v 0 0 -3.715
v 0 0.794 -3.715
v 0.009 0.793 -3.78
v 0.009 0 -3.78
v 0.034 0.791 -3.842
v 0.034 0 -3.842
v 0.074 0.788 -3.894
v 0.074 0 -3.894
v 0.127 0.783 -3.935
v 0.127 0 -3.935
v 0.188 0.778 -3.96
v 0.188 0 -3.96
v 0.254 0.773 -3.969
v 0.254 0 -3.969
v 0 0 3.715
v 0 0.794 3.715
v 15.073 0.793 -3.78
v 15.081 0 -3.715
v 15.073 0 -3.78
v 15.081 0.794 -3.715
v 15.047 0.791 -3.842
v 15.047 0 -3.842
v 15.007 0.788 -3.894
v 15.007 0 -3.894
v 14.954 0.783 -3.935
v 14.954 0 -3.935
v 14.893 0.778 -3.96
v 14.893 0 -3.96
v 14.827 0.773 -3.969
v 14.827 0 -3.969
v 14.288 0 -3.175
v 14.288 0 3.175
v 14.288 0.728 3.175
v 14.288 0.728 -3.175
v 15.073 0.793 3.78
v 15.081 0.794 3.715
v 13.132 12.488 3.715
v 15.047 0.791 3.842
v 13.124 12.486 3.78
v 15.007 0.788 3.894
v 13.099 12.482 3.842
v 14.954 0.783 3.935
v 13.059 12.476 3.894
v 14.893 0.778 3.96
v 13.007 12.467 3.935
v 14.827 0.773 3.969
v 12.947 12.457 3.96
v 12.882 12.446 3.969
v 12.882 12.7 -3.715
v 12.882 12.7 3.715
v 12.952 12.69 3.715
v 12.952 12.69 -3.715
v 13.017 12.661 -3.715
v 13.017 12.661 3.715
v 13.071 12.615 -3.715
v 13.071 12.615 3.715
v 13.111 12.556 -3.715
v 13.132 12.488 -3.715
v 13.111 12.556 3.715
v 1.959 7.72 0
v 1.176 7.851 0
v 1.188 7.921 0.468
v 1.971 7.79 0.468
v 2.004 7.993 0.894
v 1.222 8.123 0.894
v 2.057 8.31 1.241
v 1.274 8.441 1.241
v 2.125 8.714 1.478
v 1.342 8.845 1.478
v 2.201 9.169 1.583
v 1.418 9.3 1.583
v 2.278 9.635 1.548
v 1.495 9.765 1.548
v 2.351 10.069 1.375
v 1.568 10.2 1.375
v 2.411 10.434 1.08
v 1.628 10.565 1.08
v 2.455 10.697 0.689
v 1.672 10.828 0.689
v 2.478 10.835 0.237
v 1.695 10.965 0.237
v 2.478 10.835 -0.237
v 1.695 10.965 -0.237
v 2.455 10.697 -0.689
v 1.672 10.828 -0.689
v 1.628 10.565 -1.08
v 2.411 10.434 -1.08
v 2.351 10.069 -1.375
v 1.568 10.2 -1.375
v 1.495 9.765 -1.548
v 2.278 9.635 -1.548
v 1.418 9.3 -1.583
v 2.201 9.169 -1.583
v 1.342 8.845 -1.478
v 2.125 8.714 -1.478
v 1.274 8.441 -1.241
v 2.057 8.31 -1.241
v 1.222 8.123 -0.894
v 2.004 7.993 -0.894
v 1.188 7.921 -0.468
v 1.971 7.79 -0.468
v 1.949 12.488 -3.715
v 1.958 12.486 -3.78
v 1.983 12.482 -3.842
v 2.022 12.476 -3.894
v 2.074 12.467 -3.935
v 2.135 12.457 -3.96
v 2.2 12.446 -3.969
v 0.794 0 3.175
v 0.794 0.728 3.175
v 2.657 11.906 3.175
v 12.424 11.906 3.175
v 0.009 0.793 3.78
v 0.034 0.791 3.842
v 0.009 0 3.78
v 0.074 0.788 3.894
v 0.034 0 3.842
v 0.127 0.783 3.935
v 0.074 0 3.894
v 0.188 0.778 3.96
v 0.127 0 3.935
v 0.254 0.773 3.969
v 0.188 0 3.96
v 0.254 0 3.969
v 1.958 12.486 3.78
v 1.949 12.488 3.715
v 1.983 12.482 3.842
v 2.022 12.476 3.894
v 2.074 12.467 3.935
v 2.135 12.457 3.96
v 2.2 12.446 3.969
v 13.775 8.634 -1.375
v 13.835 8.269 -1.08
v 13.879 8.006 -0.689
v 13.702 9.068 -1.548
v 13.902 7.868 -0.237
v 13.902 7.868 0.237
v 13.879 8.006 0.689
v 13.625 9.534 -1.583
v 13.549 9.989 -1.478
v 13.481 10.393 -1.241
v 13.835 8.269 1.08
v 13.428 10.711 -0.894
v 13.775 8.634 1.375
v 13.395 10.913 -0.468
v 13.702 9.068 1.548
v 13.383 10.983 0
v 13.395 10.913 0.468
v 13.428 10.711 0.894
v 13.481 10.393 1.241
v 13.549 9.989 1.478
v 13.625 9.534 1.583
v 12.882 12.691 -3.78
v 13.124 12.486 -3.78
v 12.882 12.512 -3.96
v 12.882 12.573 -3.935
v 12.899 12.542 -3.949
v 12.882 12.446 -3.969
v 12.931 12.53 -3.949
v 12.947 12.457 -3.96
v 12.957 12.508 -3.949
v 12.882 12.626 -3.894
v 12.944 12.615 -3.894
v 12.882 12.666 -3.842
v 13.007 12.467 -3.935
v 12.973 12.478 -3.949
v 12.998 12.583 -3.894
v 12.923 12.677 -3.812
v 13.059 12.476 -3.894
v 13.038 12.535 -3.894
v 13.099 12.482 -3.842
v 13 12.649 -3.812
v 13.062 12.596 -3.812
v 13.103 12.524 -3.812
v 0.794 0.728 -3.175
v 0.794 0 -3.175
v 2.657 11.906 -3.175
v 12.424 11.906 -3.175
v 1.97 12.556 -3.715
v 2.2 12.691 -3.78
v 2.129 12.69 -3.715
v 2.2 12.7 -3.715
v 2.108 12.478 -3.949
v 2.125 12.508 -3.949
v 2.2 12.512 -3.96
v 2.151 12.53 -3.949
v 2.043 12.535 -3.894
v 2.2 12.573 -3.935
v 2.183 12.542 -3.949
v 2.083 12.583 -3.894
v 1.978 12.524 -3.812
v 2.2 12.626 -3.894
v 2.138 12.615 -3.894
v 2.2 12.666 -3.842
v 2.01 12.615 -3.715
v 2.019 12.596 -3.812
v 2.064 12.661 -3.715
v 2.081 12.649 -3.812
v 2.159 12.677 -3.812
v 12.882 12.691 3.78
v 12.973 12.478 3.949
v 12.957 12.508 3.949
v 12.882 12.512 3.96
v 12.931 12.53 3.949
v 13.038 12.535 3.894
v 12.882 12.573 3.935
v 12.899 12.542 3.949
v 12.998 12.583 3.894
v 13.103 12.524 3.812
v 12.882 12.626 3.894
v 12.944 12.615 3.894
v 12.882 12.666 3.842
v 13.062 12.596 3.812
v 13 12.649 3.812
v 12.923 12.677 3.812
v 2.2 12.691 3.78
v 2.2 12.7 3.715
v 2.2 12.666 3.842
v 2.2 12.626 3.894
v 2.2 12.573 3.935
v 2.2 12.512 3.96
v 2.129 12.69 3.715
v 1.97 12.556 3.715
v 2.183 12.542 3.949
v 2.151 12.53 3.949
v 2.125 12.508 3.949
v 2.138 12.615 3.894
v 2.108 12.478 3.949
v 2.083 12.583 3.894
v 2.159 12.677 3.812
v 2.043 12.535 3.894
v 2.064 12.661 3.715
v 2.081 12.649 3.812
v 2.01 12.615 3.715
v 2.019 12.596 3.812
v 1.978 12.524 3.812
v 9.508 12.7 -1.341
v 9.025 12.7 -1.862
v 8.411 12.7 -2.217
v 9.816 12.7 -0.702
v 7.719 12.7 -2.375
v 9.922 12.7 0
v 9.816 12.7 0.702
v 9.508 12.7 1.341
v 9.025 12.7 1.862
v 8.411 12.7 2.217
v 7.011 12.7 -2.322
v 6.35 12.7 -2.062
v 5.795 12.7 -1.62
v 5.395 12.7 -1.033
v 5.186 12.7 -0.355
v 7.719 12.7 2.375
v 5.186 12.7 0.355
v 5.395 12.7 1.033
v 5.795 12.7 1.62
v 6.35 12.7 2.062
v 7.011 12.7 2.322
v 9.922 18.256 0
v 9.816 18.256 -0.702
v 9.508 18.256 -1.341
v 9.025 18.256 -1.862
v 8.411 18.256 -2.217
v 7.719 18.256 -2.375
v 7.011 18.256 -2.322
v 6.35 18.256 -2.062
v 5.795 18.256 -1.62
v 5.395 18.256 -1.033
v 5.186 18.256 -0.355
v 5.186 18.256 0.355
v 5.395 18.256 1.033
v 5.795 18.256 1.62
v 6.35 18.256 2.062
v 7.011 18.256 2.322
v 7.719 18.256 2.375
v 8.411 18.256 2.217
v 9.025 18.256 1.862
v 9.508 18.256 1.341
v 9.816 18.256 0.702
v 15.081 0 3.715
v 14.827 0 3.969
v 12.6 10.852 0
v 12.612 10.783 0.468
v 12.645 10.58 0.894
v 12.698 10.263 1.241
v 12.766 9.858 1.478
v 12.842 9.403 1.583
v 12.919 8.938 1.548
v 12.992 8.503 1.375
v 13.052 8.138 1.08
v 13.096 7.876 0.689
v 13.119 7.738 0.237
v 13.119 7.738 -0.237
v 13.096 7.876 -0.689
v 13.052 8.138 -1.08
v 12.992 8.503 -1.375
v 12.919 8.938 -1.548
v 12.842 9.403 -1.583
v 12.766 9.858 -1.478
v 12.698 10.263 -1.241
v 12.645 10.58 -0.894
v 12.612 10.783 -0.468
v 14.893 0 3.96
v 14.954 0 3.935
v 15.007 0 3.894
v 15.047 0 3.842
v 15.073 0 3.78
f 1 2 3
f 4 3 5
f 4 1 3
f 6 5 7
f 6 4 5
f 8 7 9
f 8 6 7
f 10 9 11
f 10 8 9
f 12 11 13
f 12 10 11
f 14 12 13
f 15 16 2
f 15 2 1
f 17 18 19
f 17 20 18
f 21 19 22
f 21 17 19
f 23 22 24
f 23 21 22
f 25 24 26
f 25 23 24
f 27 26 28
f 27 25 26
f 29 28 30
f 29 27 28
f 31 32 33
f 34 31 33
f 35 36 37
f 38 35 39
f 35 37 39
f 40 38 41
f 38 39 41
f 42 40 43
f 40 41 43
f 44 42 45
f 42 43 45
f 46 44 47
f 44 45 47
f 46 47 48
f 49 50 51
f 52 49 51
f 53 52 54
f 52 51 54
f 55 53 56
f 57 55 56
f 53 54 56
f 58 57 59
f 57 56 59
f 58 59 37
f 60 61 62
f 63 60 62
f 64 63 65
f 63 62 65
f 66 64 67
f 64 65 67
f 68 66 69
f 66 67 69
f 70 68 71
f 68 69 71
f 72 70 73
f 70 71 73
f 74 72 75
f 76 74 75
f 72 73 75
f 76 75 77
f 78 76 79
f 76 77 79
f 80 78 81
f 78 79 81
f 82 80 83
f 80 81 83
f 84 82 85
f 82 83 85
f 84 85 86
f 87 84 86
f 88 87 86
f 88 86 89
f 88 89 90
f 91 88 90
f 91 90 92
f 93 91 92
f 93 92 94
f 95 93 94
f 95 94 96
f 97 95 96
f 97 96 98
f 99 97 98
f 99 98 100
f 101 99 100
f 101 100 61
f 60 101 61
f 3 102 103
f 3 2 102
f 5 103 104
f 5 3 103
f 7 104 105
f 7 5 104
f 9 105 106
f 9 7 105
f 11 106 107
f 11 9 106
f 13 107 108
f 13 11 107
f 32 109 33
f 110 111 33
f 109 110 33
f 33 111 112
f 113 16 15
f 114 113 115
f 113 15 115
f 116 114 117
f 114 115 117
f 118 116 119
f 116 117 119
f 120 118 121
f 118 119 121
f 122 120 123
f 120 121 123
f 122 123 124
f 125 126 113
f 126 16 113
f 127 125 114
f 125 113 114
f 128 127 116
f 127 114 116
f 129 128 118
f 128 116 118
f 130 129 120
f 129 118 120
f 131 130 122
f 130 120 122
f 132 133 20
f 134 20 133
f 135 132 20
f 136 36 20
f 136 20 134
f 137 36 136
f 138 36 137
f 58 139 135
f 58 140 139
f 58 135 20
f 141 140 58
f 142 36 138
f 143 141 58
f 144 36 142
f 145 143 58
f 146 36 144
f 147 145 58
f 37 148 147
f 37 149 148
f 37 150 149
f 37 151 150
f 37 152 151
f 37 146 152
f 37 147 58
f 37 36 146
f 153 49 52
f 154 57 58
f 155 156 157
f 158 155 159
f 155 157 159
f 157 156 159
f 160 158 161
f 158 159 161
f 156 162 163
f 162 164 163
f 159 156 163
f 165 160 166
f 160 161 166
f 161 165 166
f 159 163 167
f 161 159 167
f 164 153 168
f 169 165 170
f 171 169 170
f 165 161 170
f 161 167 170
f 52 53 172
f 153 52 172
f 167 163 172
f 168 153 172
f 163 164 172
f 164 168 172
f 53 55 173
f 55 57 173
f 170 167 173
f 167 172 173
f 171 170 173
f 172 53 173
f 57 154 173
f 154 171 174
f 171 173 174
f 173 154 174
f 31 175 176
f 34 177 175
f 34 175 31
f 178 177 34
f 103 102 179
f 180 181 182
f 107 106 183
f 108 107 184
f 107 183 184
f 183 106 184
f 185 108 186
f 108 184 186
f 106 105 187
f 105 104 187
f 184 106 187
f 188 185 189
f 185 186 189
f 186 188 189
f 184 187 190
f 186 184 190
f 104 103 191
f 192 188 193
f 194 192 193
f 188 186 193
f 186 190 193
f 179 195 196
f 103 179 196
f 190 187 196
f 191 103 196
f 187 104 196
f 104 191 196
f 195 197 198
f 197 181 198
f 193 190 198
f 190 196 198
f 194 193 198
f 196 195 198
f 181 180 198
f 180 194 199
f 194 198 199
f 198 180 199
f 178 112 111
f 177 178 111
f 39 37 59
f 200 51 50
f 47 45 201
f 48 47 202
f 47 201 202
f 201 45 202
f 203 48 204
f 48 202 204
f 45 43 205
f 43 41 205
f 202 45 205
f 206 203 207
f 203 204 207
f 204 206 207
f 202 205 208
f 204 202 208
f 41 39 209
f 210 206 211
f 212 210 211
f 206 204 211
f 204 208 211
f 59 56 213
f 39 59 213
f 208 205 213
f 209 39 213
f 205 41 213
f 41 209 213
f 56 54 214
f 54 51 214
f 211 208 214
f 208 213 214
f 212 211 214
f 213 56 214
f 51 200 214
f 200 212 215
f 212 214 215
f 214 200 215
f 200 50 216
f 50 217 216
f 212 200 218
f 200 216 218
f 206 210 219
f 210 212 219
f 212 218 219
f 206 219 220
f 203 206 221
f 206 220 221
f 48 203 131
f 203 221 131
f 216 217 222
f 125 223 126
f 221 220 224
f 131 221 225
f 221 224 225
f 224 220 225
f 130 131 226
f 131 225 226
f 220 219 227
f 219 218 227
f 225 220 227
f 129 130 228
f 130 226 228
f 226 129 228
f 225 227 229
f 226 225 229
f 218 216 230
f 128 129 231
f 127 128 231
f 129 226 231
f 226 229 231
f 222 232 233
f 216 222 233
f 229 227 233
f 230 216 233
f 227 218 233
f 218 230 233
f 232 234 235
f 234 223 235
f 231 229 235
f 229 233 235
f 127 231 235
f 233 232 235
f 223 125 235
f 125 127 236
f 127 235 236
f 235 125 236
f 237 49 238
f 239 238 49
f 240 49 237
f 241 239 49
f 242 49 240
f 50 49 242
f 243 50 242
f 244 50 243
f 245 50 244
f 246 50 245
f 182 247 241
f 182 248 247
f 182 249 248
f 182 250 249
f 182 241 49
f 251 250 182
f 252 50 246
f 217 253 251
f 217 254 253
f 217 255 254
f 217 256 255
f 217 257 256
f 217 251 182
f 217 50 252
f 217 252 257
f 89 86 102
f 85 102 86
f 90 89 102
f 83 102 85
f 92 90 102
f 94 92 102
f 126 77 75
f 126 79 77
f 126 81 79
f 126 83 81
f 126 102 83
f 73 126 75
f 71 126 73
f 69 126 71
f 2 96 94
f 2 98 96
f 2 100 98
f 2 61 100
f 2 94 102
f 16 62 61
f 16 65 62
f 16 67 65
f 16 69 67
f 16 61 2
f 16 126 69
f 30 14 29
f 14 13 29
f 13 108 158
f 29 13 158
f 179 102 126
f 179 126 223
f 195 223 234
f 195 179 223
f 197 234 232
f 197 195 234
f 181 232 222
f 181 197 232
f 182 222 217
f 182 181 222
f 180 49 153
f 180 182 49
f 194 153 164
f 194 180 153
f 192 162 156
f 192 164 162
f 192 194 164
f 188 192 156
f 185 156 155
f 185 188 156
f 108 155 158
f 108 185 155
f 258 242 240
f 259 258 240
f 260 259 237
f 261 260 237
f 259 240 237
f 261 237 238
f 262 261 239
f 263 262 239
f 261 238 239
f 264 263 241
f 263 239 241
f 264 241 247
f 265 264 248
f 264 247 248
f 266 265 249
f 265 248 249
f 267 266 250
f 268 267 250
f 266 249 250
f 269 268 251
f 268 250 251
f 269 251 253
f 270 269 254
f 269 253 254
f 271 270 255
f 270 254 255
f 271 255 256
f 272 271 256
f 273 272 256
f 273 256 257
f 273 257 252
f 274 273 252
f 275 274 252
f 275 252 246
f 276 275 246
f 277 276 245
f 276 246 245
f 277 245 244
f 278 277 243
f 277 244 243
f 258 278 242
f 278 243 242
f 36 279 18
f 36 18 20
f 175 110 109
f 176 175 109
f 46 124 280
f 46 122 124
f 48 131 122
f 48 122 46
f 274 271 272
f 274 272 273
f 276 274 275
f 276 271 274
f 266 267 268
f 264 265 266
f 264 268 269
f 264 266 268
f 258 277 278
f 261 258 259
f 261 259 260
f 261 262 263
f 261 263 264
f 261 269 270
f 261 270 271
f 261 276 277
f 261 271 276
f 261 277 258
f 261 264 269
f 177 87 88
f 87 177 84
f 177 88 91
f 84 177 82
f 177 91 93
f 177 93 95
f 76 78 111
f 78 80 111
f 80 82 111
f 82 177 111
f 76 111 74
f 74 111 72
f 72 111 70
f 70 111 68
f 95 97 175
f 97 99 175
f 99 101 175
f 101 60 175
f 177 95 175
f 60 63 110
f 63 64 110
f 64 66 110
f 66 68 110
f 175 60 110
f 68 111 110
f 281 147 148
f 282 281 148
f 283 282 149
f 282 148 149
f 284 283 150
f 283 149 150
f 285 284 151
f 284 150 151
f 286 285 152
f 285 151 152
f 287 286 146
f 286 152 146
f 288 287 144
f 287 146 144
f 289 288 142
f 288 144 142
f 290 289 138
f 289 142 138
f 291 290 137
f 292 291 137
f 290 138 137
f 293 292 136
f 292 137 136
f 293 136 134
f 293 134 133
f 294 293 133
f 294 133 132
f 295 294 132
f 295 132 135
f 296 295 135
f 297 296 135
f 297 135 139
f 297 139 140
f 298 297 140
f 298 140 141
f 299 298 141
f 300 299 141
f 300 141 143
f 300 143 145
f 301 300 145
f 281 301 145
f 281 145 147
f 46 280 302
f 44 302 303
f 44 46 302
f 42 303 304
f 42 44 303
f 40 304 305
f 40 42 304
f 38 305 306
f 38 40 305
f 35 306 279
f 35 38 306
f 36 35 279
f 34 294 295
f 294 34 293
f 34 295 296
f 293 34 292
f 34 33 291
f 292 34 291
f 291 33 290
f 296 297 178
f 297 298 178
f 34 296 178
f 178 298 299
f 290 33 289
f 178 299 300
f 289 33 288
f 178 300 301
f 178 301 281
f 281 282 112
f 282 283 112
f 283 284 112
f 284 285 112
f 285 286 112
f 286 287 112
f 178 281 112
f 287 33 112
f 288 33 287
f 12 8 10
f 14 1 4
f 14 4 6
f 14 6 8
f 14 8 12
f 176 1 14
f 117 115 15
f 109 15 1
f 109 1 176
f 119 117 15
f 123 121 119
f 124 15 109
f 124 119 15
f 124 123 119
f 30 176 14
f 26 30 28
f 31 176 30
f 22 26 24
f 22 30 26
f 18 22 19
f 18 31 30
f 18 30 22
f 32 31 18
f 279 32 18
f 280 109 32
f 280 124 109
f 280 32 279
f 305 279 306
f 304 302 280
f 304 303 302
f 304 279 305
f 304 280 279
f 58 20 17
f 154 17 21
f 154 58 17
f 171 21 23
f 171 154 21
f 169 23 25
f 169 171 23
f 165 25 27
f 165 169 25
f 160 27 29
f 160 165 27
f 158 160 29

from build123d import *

# Parameters (mm, degrees)
BOSS_EXTRUDE1_DEPTH = 3.96875
FILLET1_R           = 0.254
SHELL2_T            = -0.79375
SKETCH2_R           = 2.38125
BOSS_EXTRUDE2_DEPTH = 5.55625
SKETCH4_R           = 1.5875
CUT_EXTRUDE1_DEPTH  = 1.905
SKETCH5_R           = 1.5875
CUT_EXTRUDE2_DEPTH  = 1.905


with BuildPart() as part:
    # Sketch1 → Boss-Extrude1 (new, symmetric)
    with BuildSketch(Plane.XY):
        Polygon((0, 0), (15.08125, 0), (15.08125, 0.79375), (13.096875, 12.7), (1.984375, 12.7), (0, 0.79375), align=None)
    extrude(amount=BOSS_EXTRUDE1_DEPTH, both=True)

    # Fillet1
    fillet1_edges = [part.edges().sort_by_distance(p)[0] for p in [
        (1.984375, 12.7, 0),
        (13.096875, 12.7, 0),
        (15.08125, 0.396875, 3.96875),
        (14.0890625, 6.746875, 3.96875),
        (7.540625, 12.7, 3.96875),
        (0.9921875, 6.746875, 3.96875),
        (0, 0.396875, 3.96875),
        (0.9921875, 6.746875, -3.96875),
        (7.540625, 12.7, -3.96875),
        (14.0890625, 6.746875, -3.96875),
        (15.08125, 0.396875, -3.96875),
        (0, 0.396875, -3.96875),
    ]]
    fillet(fillet1_edges, radius=FILLET1_R)

    # Shell2
    shell2_openings = [part.faces().sort_by_distance(p)[0] for p in [
        (7.540625, 0, 0),
    ]]
    offset(amount=SHELL2_T, openings=shell2_openings, kind=Kind.INTERSECTION)

    # Sketch2 → Boss-Extrude2 (add)
    with BuildSketch(Plane(origin=(0, 12.7, 0), x_dir=(1, 0, 0), z_dir=(0, 1, 0))):
        with Locations((7.540625, 0)):
            Circle(SKETCH2_R)
    extrude(amount=BOSS_EXTRUDE2_DEPTH)

    # Sketch4 → Cut-Extrude1 (cut)
    with BuildSketch(Plane(origin=(14.802364865, 2.467060811, 0), x_dir=(0, 0, -1), z_dir=(0.9863939238321437, 0.16439898730535743, 0))):
        with Locations(Location((0, 7.045657773, 0), (0, 0, 90))):
            Circle(SKETCH4_R)
    extrude(amount=-CUT_EXTRUDE1_DEPTH, mode=Mode.SUBTRACT)

    # Sketch5 → Cut-Extrude2 (cut)
    with BuildSketch(Plane(origin=(-0.128716216, 0.021452703, 0), x_dir=(0, 0, 1), z_dir=(-0.9863939238321439, 0.16439898730535724, 0))):
        with Locations(Location((0, 9.525, 0), (0, 0, 270))):
            Circle(SKETCH5_R)
    extrude(amount=-CUT_EXTRUDE2_DEPTH, mode=Mode.SUBTRACT)


solid = part.part
